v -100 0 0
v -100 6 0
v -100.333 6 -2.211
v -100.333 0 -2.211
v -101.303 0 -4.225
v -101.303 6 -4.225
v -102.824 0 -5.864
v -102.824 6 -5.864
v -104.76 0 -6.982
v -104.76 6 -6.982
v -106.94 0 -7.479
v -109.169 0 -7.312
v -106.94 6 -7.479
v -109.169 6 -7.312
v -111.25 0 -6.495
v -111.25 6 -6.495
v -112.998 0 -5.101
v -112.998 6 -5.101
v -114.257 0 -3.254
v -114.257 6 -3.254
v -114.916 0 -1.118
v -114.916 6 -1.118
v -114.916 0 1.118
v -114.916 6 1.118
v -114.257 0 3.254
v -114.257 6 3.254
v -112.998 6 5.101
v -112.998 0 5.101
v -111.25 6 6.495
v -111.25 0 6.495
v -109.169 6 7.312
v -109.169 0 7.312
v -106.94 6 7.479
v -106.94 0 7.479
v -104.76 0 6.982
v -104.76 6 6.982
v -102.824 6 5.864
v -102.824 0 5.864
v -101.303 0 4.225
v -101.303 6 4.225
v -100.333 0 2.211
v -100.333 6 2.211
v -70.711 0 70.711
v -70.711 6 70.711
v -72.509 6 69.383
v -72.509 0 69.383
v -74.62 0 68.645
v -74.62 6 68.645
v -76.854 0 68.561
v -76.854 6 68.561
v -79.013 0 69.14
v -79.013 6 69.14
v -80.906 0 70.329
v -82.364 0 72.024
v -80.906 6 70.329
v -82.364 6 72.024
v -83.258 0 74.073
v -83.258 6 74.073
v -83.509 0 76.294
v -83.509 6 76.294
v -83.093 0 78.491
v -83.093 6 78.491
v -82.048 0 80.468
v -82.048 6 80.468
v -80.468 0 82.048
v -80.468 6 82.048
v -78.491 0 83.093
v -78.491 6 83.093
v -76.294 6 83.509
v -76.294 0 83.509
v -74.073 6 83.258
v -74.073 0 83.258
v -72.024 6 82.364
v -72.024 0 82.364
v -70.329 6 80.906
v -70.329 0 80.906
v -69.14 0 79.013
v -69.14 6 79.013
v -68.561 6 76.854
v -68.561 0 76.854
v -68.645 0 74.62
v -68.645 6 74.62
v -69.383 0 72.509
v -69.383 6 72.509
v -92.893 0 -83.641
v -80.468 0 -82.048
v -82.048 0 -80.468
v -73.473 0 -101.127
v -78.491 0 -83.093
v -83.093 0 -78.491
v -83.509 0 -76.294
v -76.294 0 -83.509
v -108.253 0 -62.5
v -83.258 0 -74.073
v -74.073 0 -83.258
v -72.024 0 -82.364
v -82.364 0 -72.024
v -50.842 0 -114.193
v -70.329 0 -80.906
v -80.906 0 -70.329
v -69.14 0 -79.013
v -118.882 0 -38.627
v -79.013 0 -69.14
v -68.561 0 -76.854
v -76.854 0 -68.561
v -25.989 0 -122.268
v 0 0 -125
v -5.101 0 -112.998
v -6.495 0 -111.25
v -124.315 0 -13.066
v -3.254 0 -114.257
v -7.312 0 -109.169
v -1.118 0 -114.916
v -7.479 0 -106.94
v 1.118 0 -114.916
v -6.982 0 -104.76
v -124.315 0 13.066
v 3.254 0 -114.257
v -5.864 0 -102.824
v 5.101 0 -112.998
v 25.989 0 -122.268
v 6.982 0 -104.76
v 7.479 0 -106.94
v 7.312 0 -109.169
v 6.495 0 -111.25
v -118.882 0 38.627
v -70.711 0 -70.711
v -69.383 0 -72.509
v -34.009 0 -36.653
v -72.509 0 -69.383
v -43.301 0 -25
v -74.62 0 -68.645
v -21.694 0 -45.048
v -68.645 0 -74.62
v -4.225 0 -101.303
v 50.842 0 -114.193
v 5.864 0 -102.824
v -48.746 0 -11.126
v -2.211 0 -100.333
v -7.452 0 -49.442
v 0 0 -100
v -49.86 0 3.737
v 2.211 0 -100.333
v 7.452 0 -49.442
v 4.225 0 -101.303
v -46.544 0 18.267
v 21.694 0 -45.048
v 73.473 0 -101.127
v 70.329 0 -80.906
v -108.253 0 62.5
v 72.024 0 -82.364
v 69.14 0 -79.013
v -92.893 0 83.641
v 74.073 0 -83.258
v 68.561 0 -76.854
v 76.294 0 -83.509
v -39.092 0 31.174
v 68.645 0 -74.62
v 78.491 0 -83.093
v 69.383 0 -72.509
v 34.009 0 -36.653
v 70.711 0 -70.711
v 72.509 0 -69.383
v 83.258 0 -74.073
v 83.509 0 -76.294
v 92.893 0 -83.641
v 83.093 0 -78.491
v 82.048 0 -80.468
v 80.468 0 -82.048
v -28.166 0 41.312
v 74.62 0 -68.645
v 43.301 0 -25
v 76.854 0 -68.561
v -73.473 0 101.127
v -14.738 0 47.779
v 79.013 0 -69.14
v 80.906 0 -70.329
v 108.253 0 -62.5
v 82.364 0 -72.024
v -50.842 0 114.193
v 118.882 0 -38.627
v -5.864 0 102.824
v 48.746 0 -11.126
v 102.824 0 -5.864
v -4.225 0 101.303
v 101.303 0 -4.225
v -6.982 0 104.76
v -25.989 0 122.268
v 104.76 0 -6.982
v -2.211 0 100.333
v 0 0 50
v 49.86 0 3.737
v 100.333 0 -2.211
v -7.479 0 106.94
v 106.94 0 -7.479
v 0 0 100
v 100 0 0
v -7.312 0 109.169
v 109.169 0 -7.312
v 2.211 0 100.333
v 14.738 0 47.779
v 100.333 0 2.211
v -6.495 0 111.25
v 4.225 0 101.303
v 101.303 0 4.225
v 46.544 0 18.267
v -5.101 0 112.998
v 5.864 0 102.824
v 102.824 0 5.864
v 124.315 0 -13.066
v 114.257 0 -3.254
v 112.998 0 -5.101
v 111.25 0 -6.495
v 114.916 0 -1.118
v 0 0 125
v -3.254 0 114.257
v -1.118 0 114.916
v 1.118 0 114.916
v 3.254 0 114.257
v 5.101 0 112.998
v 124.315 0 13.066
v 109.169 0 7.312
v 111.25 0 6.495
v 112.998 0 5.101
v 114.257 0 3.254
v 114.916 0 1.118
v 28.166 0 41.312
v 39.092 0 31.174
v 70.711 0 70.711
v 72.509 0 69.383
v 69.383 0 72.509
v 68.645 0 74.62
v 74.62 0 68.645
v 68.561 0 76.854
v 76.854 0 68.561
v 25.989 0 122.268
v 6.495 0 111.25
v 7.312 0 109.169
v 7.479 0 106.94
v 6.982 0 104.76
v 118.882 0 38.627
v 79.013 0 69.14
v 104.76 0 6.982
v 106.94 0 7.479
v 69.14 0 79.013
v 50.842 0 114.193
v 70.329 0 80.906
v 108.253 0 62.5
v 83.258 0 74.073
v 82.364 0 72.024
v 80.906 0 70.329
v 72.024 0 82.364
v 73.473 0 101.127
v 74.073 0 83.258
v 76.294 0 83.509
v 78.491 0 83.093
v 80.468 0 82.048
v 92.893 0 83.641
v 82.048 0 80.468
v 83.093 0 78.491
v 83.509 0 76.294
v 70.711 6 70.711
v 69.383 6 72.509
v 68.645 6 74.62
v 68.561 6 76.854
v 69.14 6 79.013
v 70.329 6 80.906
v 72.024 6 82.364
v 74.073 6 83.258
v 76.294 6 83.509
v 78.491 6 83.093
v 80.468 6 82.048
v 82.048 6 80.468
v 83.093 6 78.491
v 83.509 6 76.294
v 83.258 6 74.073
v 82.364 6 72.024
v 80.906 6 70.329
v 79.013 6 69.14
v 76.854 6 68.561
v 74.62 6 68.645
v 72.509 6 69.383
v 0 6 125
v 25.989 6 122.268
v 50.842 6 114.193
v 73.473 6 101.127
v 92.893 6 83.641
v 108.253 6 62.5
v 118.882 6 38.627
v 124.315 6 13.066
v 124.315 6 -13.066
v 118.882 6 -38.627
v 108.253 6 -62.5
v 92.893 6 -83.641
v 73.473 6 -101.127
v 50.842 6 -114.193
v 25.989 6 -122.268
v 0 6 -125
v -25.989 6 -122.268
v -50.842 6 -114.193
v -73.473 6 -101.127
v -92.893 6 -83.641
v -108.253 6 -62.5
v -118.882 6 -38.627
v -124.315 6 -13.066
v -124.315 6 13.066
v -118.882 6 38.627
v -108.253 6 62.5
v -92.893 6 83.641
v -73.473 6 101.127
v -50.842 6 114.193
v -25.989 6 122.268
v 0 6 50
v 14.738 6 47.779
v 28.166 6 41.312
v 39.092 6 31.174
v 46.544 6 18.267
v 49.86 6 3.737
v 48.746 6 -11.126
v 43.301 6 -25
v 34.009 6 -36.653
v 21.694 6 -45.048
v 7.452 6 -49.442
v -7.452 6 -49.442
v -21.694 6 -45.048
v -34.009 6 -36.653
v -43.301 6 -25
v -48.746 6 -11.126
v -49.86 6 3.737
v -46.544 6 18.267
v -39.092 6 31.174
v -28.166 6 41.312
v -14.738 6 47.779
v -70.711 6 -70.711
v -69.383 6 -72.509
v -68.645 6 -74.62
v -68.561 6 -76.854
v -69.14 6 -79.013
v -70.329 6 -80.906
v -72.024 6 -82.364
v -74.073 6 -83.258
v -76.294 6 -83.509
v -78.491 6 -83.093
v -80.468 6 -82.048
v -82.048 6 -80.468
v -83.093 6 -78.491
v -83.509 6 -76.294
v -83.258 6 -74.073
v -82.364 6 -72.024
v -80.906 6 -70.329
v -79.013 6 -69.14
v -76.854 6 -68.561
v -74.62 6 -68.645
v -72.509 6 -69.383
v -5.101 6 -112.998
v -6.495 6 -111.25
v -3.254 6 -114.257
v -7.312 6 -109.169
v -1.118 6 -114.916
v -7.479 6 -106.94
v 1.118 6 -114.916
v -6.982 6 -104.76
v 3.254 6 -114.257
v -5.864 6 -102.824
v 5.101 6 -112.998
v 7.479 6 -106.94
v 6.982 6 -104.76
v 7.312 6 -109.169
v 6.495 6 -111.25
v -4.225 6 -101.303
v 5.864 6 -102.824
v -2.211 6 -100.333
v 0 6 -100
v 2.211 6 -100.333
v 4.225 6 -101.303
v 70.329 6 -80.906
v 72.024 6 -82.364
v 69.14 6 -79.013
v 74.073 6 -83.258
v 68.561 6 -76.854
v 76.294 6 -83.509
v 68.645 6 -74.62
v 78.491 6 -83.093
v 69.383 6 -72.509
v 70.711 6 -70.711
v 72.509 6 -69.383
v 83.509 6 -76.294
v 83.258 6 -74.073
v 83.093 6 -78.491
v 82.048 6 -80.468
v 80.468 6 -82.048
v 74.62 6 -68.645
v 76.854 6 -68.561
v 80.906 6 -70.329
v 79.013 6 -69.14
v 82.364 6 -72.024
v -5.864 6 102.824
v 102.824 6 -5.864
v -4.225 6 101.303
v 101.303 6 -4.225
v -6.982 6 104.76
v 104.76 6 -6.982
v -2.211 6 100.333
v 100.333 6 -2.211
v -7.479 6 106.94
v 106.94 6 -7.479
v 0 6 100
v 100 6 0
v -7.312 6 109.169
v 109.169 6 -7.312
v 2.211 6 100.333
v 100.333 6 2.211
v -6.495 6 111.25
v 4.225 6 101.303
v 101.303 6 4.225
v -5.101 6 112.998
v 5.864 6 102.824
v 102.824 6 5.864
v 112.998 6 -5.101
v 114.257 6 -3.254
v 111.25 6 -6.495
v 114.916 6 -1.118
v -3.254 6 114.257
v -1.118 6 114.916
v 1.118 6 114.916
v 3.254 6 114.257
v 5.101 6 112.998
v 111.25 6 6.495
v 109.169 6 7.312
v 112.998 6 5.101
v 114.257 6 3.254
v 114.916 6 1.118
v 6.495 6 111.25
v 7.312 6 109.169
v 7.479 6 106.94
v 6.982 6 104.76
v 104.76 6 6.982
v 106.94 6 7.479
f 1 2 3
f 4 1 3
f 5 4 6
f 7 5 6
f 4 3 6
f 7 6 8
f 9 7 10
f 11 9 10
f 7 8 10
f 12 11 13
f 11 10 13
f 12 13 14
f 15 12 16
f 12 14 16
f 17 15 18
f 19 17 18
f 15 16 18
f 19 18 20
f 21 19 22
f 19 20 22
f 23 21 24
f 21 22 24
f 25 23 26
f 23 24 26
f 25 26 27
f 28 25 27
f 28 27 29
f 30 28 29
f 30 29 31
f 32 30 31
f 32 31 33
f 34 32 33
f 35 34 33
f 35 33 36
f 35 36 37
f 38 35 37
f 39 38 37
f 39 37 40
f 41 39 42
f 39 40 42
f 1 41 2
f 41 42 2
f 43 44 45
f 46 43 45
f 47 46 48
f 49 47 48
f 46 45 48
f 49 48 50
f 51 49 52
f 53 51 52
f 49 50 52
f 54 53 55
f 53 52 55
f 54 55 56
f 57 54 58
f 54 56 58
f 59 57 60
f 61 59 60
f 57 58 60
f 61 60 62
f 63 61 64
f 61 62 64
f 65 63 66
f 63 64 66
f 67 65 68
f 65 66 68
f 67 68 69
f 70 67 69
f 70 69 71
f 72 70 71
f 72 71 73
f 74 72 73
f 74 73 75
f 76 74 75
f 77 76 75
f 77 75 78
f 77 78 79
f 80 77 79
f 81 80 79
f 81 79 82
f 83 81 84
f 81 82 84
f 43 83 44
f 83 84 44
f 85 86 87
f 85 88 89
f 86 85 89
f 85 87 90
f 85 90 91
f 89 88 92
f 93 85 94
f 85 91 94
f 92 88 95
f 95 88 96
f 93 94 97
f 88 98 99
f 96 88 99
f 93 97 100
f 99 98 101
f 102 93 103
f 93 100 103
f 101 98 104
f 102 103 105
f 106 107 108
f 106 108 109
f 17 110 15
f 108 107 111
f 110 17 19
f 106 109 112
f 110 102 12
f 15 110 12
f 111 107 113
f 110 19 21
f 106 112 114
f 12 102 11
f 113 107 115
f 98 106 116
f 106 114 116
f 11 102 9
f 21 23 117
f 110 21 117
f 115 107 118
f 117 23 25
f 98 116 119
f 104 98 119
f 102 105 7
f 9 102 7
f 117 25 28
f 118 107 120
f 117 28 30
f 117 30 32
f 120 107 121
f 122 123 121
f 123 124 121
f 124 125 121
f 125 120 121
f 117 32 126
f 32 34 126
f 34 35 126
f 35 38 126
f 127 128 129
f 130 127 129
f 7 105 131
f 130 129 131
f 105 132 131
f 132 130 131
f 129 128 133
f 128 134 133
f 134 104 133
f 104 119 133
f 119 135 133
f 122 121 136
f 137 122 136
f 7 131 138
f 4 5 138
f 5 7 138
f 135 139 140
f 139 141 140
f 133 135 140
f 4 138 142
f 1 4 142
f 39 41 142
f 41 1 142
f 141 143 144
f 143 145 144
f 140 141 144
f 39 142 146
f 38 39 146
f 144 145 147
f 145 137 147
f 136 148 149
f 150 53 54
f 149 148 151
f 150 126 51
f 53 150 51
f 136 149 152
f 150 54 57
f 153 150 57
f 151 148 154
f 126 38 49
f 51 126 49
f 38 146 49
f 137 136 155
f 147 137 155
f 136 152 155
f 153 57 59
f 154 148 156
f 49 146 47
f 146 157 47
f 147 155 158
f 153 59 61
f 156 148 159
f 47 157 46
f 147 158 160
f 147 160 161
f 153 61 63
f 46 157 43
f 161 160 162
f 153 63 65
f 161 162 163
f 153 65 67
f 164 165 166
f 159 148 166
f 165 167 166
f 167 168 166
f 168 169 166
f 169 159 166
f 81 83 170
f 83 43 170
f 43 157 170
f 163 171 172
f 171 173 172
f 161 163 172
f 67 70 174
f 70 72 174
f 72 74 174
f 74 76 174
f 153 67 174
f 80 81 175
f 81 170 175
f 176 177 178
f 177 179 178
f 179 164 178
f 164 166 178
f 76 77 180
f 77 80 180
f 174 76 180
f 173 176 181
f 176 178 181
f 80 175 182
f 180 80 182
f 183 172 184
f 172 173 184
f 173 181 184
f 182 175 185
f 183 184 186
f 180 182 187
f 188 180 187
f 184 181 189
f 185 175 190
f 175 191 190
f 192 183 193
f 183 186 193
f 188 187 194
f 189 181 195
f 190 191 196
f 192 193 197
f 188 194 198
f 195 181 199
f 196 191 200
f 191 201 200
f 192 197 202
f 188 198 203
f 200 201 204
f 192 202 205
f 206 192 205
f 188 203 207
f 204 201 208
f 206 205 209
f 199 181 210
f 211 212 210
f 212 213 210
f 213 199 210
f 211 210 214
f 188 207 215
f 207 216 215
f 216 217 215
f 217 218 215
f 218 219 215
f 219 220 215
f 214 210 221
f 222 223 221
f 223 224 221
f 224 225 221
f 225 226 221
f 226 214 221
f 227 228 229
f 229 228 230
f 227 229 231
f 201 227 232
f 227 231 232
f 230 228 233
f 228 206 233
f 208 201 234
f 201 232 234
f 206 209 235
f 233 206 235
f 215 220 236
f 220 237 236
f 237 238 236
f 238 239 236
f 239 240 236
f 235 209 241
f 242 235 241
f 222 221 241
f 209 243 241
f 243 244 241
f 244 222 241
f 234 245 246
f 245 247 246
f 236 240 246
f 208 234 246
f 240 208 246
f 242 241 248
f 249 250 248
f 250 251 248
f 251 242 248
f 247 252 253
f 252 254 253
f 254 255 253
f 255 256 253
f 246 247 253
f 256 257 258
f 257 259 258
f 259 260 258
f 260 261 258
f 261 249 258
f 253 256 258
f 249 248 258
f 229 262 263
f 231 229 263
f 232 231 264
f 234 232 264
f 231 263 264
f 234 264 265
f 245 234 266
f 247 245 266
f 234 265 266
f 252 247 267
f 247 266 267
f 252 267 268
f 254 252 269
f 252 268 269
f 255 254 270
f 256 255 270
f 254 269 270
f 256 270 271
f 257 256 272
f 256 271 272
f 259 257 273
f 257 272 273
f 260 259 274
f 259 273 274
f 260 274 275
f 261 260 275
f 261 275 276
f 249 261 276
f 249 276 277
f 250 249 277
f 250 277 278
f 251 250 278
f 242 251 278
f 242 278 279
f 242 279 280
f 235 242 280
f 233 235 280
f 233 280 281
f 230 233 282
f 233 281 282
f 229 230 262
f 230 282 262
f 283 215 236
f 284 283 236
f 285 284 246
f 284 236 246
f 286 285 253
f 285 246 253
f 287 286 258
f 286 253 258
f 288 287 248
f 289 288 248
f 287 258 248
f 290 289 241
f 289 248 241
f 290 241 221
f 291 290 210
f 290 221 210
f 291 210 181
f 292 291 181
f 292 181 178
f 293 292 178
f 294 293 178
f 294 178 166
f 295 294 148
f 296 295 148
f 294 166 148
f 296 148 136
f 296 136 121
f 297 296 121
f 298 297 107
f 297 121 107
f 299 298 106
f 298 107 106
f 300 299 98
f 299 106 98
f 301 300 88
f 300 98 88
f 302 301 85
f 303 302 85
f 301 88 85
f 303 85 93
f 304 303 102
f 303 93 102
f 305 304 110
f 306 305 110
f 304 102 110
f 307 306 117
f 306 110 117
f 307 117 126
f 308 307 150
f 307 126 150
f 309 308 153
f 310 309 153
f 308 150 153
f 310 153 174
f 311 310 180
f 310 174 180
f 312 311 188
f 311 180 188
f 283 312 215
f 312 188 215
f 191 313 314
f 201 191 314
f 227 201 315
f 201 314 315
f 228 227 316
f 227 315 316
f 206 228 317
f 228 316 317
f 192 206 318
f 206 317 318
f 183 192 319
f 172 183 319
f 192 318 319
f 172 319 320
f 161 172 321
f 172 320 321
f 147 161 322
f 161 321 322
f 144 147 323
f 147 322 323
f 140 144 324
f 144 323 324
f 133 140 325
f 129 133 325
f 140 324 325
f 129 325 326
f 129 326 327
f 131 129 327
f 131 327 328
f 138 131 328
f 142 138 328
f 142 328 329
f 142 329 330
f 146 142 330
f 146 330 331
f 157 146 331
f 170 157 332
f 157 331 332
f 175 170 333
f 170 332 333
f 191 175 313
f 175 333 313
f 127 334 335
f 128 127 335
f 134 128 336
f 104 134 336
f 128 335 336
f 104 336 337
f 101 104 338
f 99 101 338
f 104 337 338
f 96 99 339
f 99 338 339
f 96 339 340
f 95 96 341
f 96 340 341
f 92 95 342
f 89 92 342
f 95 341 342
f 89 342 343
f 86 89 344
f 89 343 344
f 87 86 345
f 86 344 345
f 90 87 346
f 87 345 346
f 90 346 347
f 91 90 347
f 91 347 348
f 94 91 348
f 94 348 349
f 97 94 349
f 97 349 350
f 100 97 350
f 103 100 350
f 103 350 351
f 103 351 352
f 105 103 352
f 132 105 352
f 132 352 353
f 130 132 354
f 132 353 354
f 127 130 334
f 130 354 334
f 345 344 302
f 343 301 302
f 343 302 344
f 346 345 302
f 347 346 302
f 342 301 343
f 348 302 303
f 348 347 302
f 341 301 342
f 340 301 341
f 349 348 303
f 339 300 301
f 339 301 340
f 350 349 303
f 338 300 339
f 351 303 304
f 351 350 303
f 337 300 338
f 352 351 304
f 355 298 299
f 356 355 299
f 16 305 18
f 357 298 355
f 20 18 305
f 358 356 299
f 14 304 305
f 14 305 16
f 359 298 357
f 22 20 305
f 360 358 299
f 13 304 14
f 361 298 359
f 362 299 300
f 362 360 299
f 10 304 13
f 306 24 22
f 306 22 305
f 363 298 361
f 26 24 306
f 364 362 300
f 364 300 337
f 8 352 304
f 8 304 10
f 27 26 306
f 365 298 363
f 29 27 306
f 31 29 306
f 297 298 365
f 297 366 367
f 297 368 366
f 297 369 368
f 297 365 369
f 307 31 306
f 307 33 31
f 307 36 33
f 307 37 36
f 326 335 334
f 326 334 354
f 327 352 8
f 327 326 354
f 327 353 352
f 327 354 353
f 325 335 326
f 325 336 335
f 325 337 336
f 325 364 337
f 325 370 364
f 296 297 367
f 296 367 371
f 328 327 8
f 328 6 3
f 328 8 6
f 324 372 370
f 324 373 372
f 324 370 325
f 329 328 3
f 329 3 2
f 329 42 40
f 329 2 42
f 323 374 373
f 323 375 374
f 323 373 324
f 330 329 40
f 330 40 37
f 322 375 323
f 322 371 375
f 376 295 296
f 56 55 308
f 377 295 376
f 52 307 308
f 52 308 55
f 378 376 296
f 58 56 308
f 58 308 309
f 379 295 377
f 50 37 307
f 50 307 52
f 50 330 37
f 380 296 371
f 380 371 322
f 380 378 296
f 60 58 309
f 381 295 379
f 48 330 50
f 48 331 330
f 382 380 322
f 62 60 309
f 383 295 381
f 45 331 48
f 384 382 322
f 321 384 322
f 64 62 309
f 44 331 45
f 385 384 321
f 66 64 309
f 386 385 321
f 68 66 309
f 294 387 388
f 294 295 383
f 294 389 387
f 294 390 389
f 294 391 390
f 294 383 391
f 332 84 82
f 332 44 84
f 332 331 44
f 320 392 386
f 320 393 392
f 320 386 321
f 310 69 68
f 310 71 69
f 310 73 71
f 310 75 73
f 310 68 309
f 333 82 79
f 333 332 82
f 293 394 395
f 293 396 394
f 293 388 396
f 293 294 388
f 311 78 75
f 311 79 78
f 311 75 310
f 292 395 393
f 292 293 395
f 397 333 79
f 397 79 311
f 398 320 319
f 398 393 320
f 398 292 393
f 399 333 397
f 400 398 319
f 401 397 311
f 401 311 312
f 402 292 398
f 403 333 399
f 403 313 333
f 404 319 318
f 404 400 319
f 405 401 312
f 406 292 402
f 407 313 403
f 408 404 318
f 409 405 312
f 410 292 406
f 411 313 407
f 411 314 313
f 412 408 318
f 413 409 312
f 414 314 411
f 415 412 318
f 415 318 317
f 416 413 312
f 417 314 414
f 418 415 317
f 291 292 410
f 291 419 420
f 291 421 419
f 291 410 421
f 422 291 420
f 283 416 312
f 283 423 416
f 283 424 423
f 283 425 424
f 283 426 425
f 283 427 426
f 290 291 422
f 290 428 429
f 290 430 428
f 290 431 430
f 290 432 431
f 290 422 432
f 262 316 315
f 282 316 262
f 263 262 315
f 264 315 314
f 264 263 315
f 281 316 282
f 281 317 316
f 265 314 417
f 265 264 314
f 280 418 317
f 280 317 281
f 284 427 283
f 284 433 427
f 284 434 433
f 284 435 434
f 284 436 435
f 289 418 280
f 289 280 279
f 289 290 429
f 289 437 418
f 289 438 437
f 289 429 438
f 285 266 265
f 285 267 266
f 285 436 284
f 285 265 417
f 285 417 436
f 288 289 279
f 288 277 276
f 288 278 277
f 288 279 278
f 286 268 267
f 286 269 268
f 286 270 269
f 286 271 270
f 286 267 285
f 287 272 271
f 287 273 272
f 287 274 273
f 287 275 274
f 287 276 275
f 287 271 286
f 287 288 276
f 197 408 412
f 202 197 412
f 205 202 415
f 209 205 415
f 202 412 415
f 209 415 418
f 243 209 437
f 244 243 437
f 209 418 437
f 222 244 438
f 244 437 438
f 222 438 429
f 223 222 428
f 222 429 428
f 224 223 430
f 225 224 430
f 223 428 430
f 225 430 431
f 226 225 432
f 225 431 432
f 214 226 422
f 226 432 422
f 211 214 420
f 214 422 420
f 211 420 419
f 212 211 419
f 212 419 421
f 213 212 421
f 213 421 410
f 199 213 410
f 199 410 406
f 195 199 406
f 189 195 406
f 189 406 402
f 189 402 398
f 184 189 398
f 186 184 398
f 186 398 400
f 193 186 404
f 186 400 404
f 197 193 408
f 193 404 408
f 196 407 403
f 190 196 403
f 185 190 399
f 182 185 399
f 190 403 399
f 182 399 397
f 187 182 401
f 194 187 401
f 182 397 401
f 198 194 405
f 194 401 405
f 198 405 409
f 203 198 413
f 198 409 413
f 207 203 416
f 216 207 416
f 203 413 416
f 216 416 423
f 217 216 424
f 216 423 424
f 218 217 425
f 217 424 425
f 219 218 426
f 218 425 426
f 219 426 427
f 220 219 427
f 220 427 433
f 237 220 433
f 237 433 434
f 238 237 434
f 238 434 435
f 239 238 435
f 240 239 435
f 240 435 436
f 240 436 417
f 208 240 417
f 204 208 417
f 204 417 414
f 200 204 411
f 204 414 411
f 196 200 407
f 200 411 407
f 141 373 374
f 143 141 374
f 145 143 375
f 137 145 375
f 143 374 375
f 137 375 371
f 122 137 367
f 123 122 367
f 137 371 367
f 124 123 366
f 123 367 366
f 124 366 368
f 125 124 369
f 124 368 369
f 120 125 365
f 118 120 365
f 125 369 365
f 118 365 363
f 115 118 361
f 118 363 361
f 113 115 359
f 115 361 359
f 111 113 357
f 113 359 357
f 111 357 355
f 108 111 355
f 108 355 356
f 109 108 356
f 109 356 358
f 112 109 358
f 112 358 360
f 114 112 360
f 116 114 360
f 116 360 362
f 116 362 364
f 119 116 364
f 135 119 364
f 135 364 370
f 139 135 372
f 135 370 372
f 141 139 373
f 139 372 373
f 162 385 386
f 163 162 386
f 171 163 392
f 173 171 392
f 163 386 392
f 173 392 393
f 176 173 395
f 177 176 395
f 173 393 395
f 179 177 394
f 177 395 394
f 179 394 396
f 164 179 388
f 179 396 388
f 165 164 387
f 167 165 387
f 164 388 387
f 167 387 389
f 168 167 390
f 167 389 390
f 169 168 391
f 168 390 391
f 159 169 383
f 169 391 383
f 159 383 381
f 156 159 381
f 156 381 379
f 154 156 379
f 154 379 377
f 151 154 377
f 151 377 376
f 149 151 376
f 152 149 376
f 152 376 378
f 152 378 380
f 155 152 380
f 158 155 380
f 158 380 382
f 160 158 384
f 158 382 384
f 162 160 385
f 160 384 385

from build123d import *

# Parameters (mm, degrees)
SKETCH1_R           = 125
BOSS_EXTRUDE1_DEPTH = 6
SKETCH2_R           = 50
CUT_EXTRUDE1_DEPTH  = 6
SKETCH3_R           = 7.5
CUT_EXTRUDE2_DEPTH  = 6
CIRPATTERN1_COUNT   = 8


with BuildPart() as part:
    # Sketch1 → Boss-Extrude1 (new body)
    with BuildSketch(Plane(origin=(0, 0, 0), x_dir=(1, 0, 0), z_dir=(0, 1, 0))):
        with Locations(Location((0, 0, 0), (0, 0, 270))):
            Circle(SKETCH1_R)
    extrude(amount=BOSS_EXTRUDE1_DEPTH)

    # Sketch2 → Cut-Extrude1 (cut)
    with BuildSketch(Plane(origin=(0, 6, 0), x_dir=(1, 0, 0), z_dir=(0, 1, 0))):
        with Locations(Location((0, 0, 0), (0, 0, 270))):
            Circle(SKETCH2_R)
    extrude(amount=-CUT_EXTRUDE1_DEPTH, mode=Mode.SUBTRACT)

    # Sketch3 → Cut-Extrude2 (cut)
    with BuildSketch(Plane(origin=(0, 6, 0), x_dir=(1, 0, 0), z_dir=(0, 1, 0))):
        with Locations(Location((0, 107.5, 0), (0, 0, 270))):
            Circle(SKETCH3_R)
    cut_extrude2 = extrude(amount=-CUT_EXTRUDE2_DEPTH, mode=Mode.SUBTRACT)

    # CirPattern1: Cut-Extrude2 ×8 about axis
    cirpattern1_axis = Axis((0, 0, 0), (0, 1, 0))
    for i in range(1, CIRPATTERN1_COUNT):
        add(cut_extrude2.rotate(cirpattern1_axis, i * 360 / CIRPATTERN1_COUNT), mode=Mode.SUBTRACT)


solid = part.part
